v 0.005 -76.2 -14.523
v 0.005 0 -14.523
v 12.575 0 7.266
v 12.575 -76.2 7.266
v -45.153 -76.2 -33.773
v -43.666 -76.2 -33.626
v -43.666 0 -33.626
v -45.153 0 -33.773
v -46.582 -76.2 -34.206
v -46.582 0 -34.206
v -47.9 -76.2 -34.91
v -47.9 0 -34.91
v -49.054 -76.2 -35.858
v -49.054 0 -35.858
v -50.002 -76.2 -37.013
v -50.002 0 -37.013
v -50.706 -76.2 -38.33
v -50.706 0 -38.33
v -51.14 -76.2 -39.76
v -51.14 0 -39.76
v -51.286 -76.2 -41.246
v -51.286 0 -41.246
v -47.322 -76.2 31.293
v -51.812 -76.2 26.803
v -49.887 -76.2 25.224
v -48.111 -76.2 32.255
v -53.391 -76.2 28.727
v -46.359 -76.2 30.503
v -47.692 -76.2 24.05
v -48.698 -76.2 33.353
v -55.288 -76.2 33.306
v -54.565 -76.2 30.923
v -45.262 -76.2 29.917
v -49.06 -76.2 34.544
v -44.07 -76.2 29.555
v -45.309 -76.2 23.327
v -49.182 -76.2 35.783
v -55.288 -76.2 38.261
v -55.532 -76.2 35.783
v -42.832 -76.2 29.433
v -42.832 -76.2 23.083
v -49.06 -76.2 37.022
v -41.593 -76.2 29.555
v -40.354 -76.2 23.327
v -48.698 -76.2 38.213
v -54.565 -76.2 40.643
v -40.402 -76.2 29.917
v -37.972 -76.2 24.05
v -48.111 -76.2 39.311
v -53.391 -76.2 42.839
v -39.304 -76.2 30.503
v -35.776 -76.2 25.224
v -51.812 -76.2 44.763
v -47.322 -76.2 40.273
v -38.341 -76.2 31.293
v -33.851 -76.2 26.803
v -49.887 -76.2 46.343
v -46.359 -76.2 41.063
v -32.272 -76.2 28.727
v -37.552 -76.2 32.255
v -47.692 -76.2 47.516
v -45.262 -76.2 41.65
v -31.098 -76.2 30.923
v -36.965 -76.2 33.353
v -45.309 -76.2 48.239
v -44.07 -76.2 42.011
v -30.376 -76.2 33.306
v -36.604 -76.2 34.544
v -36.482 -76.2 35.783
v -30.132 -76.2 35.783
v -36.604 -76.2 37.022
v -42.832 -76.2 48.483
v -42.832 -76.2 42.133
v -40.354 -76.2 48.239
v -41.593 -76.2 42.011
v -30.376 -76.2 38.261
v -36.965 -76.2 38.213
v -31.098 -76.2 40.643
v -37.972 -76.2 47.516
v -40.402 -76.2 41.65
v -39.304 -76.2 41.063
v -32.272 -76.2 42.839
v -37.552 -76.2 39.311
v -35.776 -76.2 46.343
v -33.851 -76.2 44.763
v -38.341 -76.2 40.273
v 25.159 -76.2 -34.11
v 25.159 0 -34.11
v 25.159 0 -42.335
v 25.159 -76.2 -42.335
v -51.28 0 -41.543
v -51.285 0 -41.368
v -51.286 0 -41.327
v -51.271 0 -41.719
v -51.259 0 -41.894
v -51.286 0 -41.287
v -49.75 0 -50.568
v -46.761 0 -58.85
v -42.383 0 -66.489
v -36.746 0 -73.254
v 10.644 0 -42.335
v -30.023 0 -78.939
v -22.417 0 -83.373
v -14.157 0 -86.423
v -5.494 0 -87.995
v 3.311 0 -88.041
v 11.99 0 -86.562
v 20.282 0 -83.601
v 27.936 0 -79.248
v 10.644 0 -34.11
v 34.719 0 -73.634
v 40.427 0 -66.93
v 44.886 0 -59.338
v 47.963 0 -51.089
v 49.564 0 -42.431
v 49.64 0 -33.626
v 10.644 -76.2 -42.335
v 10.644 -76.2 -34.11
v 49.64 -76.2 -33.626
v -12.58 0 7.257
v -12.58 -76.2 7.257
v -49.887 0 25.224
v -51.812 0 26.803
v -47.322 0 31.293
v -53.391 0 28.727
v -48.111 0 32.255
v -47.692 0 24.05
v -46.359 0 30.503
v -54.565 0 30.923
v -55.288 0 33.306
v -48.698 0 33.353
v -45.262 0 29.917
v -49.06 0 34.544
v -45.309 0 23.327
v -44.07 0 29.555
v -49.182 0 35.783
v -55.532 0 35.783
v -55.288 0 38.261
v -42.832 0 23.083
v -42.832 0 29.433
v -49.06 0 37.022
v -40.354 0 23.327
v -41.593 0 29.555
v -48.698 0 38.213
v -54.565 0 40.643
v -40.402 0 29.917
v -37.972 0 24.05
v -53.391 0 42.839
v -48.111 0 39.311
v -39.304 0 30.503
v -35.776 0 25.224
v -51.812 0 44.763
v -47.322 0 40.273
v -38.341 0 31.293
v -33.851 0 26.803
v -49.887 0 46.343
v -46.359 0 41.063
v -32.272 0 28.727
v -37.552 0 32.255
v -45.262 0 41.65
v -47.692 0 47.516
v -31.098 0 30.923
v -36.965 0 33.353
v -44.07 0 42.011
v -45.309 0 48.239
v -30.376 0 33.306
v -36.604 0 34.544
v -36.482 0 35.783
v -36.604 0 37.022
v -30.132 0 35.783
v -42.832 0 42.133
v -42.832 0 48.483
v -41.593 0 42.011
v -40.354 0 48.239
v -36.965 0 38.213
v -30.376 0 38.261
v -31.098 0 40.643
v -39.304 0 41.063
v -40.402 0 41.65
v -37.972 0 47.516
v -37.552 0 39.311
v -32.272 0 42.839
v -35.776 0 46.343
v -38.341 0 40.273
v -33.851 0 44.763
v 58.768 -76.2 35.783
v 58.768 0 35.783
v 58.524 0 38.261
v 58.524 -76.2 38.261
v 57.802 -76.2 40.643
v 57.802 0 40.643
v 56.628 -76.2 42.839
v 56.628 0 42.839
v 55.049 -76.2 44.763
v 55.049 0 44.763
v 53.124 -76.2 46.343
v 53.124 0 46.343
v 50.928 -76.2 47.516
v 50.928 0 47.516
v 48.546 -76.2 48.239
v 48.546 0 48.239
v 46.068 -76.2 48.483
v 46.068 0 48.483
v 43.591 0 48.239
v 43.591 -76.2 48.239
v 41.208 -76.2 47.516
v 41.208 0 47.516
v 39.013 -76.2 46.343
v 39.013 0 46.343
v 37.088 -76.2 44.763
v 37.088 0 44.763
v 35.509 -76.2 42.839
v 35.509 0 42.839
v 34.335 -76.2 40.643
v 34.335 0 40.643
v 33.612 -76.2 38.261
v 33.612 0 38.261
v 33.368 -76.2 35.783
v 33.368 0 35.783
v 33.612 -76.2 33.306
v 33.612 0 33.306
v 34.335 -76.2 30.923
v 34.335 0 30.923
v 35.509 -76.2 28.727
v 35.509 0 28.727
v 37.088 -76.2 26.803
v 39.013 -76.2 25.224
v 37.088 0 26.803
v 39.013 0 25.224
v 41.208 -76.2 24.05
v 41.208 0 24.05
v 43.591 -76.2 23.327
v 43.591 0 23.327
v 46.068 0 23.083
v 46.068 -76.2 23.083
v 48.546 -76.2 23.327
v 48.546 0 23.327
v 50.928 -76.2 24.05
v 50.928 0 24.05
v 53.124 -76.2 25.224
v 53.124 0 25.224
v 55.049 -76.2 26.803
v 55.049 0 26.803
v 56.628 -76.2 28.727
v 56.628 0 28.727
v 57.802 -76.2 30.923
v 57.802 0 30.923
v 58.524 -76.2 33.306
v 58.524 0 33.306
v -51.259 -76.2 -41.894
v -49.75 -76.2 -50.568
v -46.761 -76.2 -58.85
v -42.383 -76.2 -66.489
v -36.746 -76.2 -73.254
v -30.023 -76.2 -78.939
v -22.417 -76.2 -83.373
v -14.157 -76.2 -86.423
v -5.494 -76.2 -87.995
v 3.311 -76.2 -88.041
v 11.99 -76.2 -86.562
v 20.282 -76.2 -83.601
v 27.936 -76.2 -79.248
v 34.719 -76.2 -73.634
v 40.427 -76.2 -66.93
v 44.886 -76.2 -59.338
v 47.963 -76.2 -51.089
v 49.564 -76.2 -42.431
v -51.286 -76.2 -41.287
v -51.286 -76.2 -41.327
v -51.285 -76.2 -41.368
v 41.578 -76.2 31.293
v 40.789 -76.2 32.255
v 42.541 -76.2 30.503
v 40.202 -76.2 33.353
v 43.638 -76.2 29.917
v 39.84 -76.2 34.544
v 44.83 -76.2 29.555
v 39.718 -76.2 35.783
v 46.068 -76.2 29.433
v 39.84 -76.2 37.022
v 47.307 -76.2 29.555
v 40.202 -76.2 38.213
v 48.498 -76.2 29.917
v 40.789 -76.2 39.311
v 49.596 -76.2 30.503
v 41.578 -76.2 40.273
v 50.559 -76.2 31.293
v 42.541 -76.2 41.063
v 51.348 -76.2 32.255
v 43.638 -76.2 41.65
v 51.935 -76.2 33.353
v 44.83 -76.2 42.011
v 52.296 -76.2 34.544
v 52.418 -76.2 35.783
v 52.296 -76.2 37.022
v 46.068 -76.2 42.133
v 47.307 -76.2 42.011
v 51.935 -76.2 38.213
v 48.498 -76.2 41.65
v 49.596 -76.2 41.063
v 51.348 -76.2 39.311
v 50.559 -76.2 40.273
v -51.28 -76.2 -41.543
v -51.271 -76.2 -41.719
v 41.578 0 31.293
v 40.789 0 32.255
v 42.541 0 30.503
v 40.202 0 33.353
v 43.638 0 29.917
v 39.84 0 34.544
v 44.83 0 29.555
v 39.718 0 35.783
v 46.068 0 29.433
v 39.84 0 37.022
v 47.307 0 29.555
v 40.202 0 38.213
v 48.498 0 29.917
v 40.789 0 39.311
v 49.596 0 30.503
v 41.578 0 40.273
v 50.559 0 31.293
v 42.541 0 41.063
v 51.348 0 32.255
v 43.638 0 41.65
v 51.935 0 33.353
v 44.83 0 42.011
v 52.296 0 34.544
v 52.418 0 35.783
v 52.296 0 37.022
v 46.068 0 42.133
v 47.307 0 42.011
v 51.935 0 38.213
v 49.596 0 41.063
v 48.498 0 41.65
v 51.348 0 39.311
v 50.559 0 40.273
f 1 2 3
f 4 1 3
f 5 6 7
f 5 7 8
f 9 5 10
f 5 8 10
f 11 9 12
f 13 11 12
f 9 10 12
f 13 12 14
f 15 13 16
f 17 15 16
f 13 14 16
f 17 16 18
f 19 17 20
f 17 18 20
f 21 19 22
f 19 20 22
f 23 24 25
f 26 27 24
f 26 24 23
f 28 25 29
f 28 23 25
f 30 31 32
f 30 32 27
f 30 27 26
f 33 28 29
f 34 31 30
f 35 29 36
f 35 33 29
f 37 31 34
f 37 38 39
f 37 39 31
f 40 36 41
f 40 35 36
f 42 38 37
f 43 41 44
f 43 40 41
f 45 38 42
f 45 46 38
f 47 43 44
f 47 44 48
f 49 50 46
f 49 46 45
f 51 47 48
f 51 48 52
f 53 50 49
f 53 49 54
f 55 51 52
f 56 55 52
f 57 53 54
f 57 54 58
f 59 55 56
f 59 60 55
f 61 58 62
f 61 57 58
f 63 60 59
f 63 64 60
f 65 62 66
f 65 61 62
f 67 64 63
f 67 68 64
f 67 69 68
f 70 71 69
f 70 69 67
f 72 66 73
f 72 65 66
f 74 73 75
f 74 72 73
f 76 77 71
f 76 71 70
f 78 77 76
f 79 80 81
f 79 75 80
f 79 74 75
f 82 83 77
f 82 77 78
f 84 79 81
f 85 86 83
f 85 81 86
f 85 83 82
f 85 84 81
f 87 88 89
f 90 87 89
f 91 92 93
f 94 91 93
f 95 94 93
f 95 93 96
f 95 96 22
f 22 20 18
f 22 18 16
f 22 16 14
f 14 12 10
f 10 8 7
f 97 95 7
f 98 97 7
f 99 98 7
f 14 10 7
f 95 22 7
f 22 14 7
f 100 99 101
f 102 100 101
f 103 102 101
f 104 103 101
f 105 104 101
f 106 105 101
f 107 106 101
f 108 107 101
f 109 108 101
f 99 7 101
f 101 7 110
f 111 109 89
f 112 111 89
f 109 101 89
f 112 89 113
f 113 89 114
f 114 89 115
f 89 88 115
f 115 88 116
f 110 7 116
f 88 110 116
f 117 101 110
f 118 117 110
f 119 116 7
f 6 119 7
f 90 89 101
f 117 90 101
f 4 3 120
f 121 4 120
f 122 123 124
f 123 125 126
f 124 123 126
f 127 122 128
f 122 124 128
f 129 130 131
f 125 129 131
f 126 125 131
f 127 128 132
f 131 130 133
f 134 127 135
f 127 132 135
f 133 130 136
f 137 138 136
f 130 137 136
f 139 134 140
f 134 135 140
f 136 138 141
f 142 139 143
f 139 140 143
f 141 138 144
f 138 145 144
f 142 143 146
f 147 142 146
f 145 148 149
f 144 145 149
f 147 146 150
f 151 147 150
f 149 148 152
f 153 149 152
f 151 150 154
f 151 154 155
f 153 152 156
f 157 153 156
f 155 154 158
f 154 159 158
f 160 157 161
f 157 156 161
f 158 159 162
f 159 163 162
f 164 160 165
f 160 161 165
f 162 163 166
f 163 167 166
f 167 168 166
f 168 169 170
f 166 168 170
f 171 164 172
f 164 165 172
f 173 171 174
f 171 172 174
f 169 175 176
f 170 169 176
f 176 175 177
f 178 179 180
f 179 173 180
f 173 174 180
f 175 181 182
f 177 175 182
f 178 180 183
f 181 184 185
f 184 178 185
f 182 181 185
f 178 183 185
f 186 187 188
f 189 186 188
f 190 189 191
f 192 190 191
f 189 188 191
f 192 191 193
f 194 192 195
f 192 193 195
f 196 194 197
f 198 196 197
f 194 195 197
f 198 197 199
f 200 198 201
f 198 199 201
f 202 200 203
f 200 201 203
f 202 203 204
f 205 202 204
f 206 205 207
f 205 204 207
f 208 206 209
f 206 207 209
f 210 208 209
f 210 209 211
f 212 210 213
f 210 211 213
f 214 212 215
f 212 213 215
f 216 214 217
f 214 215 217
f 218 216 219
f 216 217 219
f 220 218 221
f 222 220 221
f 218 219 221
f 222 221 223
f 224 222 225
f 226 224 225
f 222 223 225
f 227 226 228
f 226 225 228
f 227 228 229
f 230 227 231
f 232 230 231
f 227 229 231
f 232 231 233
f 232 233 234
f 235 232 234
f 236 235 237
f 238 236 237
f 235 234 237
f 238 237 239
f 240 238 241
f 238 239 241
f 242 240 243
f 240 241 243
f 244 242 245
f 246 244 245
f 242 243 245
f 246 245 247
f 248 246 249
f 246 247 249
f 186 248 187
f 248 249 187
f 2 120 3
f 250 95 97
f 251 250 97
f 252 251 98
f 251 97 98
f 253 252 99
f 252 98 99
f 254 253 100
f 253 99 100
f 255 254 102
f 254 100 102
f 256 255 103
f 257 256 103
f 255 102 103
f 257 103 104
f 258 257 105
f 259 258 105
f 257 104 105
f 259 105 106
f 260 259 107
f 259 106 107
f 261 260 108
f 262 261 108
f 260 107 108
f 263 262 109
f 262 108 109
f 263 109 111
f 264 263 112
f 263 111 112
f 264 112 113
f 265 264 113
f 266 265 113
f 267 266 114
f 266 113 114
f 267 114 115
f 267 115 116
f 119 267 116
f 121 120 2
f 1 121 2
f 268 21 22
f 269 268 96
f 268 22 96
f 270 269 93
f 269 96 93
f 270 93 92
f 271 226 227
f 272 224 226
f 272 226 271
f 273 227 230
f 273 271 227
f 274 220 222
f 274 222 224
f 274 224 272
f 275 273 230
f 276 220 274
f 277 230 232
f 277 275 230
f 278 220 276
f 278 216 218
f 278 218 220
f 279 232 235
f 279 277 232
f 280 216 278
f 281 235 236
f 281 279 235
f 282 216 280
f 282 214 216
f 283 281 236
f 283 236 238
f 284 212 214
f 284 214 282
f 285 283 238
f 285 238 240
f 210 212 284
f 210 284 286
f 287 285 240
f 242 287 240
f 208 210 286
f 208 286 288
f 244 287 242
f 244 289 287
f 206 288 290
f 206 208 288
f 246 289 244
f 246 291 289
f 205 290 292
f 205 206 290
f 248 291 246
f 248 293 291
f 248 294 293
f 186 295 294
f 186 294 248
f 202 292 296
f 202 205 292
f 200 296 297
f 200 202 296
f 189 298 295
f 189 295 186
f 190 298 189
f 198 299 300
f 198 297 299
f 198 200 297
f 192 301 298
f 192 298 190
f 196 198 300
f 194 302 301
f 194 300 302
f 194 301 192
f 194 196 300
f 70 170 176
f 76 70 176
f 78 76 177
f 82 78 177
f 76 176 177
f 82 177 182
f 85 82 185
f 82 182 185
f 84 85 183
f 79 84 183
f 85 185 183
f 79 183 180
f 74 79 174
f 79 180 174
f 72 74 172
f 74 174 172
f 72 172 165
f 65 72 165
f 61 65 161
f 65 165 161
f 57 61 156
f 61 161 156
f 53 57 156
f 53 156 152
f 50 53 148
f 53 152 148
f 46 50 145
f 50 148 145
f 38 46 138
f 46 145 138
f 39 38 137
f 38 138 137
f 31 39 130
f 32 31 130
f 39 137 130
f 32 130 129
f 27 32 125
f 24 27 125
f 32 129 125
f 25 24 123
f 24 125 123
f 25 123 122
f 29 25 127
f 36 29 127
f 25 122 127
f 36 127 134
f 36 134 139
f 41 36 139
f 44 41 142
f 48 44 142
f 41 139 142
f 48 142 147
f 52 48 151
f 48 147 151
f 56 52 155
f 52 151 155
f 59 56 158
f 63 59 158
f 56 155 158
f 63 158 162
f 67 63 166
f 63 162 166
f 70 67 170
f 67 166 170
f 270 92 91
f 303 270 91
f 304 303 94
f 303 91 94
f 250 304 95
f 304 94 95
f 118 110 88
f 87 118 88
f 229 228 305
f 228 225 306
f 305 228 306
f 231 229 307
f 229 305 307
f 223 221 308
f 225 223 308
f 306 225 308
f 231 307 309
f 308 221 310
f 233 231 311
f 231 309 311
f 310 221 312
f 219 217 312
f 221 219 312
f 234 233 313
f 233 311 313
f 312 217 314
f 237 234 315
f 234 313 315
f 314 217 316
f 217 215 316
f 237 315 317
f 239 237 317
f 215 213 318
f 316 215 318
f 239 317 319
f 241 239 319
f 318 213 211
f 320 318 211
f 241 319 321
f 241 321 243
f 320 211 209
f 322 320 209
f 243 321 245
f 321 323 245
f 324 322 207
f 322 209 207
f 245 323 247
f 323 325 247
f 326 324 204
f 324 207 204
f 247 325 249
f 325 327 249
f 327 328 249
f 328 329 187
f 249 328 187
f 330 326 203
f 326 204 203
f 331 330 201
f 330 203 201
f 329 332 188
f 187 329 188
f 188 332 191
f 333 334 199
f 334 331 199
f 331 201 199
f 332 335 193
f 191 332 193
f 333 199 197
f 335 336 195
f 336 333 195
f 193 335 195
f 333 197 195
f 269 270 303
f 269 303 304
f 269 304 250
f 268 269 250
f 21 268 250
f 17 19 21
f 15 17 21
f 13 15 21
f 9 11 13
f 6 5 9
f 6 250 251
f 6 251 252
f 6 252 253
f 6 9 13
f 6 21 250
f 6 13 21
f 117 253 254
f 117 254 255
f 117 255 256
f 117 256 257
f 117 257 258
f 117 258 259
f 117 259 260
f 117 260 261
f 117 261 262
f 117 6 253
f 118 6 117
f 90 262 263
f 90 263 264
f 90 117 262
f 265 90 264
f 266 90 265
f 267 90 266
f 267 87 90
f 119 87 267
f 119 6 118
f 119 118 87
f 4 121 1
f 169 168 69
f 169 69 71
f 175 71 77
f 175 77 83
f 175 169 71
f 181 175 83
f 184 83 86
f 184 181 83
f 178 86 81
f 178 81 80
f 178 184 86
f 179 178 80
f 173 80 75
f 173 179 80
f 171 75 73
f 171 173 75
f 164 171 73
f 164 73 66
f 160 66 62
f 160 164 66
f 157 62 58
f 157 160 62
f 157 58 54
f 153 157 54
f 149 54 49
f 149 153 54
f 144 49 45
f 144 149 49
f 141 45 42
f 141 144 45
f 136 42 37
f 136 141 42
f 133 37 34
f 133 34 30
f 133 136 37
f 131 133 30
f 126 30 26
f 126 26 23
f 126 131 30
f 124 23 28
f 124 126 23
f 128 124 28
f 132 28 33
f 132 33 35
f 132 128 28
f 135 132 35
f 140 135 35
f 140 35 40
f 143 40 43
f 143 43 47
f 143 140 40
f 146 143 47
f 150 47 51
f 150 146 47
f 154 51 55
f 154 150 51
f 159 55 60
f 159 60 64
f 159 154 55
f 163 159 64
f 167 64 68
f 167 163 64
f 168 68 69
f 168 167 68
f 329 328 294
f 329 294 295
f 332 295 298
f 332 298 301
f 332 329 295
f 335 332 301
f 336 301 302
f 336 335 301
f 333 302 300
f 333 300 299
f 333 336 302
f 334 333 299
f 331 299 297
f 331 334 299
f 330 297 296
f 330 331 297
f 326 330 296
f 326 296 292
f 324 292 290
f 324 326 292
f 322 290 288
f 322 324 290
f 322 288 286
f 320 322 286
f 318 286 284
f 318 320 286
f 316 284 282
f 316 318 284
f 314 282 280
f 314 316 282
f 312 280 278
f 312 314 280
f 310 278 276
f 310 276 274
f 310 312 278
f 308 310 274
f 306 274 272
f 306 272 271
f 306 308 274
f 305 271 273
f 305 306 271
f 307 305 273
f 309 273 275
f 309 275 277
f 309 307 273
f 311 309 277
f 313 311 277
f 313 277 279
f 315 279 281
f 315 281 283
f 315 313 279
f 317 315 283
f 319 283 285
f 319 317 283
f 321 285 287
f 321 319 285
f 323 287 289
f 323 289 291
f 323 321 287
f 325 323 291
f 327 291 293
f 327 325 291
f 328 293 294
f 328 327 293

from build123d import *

# Parameters (mm, degrees)
F1_DEPTH = 76.2
F0_R     = 12.7
F0_R_2   = 6.35
F0_W     = 14.0311091589
F0_H     = 0.483832124
F0_W_2   = 14.0311132381
F0_H_2   = 7.7413058248


with BuildPart() as f1:
    # F0 (on Front) → F1 (new body)
    with BuildSketch(Plane.XZ):
        Polygon((0.0046560519, -14.5229986625), (12.5749577549, 7.2655315905), (-12.5796138068, 7.2574670721), align=None)
    extrude(amount=F1_DEPTH)


with BuildPart() as f1b:
    # F0 (on Front) → F1, piece 2 (new body)
    with BuildSketch(Plane.XZ):
        with Locations((-42.8316236274, 35.7832270636)):
            Circle(F0_R)
        with Locations((-42.8316236274, 35.7832270636)):
            Circle(F0_R_2, mode=Mode.SUBTRACT)
    extrude(amount=F1_DEPTH)


with BuildPart() as f1c:
    # F0 (on Front) → F1, piece 3 (new body)
    with BuildSketch(Plane.XZ):
        with Locations((46.0683763726, 35.7832270636)):
            Circle(F0_R)
        with Locations((46.0683763726, 35.7832270636)):
            Circle(F0_R_2, mode=Mode.SUBTRACT)
    extrude(amount=F1_DEPTH)


with BuildPart() as f1d:
    # F0 (on Front) → F1, piece 4 (new body)
    with BuildSketch(Plane.XZ):
        with BuildLine():
            Line((-33.868199726, -33.626283664), (-43.6661317129, -33.626283664))
            ThreePointArc((-43.6661317129, -33.626283664), (-49.0542853856, -35.8581299914), (-51.2861317129, -41.246283664))
            ThreePointArc((-51.2861317129, -41.246283664), (-51.2858903043, -41.306938498), (-51.2851660938, -41.3675894888))
            Line((-51.2851660938, -41.3675894888), (-33.868199726, -41.3675894888))
            Line((-33.868199726, -41.3675894888), (-33.868199726, -33.626283664))
        make_face()
        with Locations((17.659853148, -33.868199726)):
            Rectangle(F0_W, F0_H)
        with Locations((-26.8526431069, -37.4969365764)):
            Rectangle(F0_W_2, F0_H_2)
        Polygon((-4.3544824868, -33.626283664), (-19.8370864879, -33.626283664), (-19.8370864879, -41.3675894888), (-19.8370864879, -41.8514175335), (-4.3544824868, -41.8514175335), align=None)
        Polygon((36.7711924697, -33.626283664), (24.6754077274, -33.626283664), (24.6754077274, -34.110115788), (25.1592398514, -34.110115788), (25.1592398514, -41.8514175335), (36.7711924697, -41.8514175335), align=None)
        Polygon((10.6442985686, -33.626283664), (-4.3544824868, -33.626283664), (-4.3544824868, -41.8514175335), (10.6442985686, -41.8514175335), (10.6442985686, -34.110115788), align=None)
        with BuildLine():
            Line((-19.8370864879, -41.3675894888), (-33.868199726, -41.3675894888))
            Line((-33.868199726, -41.3675894888), (-51.2851660938, -41.3675894888))
            ThreePointArc((-51.2851660938, -41.3675894888), (-51.2764150356, -41.6309754224), (-51.2585615924, -41.8939012401))
            ThreePointArc((-51.2585615924, -41.8939012401), (3.3108353665, -88.0414891688), (49.6401389008, -33.626283664))
            Line((49.6401389008, -33.626283664), (36.7711924697, -33.626283664))
            Line((36.7711924697, -33.626283664), (36.7711924697, -41.8514175335))
            Line((36.7711924697, -41.8514175335), (25.1592398514, -41.8514175335))
            Line((25.1592398514, -41.8514175335), (25.1592398514, -42.3352496575))
            Line((25.1592398514, -42.3352496575), (10.6442985686, -42.3352496575))
            Line((10.6442985686, -42.3352496575), (10.6442985686, -41.8514175335))
            Line((10.6442985686, -41.8514175335), (-4.3544824868, -41.8514175335))
            Line((-4.3544824868, -41.8514175335), (-19.8370864879, -41.8514175335))
            Line((-19.8370864879, -41.8514175335), (-19.8370864879, -41.3675894888))
        make_face()
    extrude(amount=F1_DEPTH)


solid = Compound([f1.part, f1b.part, f1c.part, f1d.part])
